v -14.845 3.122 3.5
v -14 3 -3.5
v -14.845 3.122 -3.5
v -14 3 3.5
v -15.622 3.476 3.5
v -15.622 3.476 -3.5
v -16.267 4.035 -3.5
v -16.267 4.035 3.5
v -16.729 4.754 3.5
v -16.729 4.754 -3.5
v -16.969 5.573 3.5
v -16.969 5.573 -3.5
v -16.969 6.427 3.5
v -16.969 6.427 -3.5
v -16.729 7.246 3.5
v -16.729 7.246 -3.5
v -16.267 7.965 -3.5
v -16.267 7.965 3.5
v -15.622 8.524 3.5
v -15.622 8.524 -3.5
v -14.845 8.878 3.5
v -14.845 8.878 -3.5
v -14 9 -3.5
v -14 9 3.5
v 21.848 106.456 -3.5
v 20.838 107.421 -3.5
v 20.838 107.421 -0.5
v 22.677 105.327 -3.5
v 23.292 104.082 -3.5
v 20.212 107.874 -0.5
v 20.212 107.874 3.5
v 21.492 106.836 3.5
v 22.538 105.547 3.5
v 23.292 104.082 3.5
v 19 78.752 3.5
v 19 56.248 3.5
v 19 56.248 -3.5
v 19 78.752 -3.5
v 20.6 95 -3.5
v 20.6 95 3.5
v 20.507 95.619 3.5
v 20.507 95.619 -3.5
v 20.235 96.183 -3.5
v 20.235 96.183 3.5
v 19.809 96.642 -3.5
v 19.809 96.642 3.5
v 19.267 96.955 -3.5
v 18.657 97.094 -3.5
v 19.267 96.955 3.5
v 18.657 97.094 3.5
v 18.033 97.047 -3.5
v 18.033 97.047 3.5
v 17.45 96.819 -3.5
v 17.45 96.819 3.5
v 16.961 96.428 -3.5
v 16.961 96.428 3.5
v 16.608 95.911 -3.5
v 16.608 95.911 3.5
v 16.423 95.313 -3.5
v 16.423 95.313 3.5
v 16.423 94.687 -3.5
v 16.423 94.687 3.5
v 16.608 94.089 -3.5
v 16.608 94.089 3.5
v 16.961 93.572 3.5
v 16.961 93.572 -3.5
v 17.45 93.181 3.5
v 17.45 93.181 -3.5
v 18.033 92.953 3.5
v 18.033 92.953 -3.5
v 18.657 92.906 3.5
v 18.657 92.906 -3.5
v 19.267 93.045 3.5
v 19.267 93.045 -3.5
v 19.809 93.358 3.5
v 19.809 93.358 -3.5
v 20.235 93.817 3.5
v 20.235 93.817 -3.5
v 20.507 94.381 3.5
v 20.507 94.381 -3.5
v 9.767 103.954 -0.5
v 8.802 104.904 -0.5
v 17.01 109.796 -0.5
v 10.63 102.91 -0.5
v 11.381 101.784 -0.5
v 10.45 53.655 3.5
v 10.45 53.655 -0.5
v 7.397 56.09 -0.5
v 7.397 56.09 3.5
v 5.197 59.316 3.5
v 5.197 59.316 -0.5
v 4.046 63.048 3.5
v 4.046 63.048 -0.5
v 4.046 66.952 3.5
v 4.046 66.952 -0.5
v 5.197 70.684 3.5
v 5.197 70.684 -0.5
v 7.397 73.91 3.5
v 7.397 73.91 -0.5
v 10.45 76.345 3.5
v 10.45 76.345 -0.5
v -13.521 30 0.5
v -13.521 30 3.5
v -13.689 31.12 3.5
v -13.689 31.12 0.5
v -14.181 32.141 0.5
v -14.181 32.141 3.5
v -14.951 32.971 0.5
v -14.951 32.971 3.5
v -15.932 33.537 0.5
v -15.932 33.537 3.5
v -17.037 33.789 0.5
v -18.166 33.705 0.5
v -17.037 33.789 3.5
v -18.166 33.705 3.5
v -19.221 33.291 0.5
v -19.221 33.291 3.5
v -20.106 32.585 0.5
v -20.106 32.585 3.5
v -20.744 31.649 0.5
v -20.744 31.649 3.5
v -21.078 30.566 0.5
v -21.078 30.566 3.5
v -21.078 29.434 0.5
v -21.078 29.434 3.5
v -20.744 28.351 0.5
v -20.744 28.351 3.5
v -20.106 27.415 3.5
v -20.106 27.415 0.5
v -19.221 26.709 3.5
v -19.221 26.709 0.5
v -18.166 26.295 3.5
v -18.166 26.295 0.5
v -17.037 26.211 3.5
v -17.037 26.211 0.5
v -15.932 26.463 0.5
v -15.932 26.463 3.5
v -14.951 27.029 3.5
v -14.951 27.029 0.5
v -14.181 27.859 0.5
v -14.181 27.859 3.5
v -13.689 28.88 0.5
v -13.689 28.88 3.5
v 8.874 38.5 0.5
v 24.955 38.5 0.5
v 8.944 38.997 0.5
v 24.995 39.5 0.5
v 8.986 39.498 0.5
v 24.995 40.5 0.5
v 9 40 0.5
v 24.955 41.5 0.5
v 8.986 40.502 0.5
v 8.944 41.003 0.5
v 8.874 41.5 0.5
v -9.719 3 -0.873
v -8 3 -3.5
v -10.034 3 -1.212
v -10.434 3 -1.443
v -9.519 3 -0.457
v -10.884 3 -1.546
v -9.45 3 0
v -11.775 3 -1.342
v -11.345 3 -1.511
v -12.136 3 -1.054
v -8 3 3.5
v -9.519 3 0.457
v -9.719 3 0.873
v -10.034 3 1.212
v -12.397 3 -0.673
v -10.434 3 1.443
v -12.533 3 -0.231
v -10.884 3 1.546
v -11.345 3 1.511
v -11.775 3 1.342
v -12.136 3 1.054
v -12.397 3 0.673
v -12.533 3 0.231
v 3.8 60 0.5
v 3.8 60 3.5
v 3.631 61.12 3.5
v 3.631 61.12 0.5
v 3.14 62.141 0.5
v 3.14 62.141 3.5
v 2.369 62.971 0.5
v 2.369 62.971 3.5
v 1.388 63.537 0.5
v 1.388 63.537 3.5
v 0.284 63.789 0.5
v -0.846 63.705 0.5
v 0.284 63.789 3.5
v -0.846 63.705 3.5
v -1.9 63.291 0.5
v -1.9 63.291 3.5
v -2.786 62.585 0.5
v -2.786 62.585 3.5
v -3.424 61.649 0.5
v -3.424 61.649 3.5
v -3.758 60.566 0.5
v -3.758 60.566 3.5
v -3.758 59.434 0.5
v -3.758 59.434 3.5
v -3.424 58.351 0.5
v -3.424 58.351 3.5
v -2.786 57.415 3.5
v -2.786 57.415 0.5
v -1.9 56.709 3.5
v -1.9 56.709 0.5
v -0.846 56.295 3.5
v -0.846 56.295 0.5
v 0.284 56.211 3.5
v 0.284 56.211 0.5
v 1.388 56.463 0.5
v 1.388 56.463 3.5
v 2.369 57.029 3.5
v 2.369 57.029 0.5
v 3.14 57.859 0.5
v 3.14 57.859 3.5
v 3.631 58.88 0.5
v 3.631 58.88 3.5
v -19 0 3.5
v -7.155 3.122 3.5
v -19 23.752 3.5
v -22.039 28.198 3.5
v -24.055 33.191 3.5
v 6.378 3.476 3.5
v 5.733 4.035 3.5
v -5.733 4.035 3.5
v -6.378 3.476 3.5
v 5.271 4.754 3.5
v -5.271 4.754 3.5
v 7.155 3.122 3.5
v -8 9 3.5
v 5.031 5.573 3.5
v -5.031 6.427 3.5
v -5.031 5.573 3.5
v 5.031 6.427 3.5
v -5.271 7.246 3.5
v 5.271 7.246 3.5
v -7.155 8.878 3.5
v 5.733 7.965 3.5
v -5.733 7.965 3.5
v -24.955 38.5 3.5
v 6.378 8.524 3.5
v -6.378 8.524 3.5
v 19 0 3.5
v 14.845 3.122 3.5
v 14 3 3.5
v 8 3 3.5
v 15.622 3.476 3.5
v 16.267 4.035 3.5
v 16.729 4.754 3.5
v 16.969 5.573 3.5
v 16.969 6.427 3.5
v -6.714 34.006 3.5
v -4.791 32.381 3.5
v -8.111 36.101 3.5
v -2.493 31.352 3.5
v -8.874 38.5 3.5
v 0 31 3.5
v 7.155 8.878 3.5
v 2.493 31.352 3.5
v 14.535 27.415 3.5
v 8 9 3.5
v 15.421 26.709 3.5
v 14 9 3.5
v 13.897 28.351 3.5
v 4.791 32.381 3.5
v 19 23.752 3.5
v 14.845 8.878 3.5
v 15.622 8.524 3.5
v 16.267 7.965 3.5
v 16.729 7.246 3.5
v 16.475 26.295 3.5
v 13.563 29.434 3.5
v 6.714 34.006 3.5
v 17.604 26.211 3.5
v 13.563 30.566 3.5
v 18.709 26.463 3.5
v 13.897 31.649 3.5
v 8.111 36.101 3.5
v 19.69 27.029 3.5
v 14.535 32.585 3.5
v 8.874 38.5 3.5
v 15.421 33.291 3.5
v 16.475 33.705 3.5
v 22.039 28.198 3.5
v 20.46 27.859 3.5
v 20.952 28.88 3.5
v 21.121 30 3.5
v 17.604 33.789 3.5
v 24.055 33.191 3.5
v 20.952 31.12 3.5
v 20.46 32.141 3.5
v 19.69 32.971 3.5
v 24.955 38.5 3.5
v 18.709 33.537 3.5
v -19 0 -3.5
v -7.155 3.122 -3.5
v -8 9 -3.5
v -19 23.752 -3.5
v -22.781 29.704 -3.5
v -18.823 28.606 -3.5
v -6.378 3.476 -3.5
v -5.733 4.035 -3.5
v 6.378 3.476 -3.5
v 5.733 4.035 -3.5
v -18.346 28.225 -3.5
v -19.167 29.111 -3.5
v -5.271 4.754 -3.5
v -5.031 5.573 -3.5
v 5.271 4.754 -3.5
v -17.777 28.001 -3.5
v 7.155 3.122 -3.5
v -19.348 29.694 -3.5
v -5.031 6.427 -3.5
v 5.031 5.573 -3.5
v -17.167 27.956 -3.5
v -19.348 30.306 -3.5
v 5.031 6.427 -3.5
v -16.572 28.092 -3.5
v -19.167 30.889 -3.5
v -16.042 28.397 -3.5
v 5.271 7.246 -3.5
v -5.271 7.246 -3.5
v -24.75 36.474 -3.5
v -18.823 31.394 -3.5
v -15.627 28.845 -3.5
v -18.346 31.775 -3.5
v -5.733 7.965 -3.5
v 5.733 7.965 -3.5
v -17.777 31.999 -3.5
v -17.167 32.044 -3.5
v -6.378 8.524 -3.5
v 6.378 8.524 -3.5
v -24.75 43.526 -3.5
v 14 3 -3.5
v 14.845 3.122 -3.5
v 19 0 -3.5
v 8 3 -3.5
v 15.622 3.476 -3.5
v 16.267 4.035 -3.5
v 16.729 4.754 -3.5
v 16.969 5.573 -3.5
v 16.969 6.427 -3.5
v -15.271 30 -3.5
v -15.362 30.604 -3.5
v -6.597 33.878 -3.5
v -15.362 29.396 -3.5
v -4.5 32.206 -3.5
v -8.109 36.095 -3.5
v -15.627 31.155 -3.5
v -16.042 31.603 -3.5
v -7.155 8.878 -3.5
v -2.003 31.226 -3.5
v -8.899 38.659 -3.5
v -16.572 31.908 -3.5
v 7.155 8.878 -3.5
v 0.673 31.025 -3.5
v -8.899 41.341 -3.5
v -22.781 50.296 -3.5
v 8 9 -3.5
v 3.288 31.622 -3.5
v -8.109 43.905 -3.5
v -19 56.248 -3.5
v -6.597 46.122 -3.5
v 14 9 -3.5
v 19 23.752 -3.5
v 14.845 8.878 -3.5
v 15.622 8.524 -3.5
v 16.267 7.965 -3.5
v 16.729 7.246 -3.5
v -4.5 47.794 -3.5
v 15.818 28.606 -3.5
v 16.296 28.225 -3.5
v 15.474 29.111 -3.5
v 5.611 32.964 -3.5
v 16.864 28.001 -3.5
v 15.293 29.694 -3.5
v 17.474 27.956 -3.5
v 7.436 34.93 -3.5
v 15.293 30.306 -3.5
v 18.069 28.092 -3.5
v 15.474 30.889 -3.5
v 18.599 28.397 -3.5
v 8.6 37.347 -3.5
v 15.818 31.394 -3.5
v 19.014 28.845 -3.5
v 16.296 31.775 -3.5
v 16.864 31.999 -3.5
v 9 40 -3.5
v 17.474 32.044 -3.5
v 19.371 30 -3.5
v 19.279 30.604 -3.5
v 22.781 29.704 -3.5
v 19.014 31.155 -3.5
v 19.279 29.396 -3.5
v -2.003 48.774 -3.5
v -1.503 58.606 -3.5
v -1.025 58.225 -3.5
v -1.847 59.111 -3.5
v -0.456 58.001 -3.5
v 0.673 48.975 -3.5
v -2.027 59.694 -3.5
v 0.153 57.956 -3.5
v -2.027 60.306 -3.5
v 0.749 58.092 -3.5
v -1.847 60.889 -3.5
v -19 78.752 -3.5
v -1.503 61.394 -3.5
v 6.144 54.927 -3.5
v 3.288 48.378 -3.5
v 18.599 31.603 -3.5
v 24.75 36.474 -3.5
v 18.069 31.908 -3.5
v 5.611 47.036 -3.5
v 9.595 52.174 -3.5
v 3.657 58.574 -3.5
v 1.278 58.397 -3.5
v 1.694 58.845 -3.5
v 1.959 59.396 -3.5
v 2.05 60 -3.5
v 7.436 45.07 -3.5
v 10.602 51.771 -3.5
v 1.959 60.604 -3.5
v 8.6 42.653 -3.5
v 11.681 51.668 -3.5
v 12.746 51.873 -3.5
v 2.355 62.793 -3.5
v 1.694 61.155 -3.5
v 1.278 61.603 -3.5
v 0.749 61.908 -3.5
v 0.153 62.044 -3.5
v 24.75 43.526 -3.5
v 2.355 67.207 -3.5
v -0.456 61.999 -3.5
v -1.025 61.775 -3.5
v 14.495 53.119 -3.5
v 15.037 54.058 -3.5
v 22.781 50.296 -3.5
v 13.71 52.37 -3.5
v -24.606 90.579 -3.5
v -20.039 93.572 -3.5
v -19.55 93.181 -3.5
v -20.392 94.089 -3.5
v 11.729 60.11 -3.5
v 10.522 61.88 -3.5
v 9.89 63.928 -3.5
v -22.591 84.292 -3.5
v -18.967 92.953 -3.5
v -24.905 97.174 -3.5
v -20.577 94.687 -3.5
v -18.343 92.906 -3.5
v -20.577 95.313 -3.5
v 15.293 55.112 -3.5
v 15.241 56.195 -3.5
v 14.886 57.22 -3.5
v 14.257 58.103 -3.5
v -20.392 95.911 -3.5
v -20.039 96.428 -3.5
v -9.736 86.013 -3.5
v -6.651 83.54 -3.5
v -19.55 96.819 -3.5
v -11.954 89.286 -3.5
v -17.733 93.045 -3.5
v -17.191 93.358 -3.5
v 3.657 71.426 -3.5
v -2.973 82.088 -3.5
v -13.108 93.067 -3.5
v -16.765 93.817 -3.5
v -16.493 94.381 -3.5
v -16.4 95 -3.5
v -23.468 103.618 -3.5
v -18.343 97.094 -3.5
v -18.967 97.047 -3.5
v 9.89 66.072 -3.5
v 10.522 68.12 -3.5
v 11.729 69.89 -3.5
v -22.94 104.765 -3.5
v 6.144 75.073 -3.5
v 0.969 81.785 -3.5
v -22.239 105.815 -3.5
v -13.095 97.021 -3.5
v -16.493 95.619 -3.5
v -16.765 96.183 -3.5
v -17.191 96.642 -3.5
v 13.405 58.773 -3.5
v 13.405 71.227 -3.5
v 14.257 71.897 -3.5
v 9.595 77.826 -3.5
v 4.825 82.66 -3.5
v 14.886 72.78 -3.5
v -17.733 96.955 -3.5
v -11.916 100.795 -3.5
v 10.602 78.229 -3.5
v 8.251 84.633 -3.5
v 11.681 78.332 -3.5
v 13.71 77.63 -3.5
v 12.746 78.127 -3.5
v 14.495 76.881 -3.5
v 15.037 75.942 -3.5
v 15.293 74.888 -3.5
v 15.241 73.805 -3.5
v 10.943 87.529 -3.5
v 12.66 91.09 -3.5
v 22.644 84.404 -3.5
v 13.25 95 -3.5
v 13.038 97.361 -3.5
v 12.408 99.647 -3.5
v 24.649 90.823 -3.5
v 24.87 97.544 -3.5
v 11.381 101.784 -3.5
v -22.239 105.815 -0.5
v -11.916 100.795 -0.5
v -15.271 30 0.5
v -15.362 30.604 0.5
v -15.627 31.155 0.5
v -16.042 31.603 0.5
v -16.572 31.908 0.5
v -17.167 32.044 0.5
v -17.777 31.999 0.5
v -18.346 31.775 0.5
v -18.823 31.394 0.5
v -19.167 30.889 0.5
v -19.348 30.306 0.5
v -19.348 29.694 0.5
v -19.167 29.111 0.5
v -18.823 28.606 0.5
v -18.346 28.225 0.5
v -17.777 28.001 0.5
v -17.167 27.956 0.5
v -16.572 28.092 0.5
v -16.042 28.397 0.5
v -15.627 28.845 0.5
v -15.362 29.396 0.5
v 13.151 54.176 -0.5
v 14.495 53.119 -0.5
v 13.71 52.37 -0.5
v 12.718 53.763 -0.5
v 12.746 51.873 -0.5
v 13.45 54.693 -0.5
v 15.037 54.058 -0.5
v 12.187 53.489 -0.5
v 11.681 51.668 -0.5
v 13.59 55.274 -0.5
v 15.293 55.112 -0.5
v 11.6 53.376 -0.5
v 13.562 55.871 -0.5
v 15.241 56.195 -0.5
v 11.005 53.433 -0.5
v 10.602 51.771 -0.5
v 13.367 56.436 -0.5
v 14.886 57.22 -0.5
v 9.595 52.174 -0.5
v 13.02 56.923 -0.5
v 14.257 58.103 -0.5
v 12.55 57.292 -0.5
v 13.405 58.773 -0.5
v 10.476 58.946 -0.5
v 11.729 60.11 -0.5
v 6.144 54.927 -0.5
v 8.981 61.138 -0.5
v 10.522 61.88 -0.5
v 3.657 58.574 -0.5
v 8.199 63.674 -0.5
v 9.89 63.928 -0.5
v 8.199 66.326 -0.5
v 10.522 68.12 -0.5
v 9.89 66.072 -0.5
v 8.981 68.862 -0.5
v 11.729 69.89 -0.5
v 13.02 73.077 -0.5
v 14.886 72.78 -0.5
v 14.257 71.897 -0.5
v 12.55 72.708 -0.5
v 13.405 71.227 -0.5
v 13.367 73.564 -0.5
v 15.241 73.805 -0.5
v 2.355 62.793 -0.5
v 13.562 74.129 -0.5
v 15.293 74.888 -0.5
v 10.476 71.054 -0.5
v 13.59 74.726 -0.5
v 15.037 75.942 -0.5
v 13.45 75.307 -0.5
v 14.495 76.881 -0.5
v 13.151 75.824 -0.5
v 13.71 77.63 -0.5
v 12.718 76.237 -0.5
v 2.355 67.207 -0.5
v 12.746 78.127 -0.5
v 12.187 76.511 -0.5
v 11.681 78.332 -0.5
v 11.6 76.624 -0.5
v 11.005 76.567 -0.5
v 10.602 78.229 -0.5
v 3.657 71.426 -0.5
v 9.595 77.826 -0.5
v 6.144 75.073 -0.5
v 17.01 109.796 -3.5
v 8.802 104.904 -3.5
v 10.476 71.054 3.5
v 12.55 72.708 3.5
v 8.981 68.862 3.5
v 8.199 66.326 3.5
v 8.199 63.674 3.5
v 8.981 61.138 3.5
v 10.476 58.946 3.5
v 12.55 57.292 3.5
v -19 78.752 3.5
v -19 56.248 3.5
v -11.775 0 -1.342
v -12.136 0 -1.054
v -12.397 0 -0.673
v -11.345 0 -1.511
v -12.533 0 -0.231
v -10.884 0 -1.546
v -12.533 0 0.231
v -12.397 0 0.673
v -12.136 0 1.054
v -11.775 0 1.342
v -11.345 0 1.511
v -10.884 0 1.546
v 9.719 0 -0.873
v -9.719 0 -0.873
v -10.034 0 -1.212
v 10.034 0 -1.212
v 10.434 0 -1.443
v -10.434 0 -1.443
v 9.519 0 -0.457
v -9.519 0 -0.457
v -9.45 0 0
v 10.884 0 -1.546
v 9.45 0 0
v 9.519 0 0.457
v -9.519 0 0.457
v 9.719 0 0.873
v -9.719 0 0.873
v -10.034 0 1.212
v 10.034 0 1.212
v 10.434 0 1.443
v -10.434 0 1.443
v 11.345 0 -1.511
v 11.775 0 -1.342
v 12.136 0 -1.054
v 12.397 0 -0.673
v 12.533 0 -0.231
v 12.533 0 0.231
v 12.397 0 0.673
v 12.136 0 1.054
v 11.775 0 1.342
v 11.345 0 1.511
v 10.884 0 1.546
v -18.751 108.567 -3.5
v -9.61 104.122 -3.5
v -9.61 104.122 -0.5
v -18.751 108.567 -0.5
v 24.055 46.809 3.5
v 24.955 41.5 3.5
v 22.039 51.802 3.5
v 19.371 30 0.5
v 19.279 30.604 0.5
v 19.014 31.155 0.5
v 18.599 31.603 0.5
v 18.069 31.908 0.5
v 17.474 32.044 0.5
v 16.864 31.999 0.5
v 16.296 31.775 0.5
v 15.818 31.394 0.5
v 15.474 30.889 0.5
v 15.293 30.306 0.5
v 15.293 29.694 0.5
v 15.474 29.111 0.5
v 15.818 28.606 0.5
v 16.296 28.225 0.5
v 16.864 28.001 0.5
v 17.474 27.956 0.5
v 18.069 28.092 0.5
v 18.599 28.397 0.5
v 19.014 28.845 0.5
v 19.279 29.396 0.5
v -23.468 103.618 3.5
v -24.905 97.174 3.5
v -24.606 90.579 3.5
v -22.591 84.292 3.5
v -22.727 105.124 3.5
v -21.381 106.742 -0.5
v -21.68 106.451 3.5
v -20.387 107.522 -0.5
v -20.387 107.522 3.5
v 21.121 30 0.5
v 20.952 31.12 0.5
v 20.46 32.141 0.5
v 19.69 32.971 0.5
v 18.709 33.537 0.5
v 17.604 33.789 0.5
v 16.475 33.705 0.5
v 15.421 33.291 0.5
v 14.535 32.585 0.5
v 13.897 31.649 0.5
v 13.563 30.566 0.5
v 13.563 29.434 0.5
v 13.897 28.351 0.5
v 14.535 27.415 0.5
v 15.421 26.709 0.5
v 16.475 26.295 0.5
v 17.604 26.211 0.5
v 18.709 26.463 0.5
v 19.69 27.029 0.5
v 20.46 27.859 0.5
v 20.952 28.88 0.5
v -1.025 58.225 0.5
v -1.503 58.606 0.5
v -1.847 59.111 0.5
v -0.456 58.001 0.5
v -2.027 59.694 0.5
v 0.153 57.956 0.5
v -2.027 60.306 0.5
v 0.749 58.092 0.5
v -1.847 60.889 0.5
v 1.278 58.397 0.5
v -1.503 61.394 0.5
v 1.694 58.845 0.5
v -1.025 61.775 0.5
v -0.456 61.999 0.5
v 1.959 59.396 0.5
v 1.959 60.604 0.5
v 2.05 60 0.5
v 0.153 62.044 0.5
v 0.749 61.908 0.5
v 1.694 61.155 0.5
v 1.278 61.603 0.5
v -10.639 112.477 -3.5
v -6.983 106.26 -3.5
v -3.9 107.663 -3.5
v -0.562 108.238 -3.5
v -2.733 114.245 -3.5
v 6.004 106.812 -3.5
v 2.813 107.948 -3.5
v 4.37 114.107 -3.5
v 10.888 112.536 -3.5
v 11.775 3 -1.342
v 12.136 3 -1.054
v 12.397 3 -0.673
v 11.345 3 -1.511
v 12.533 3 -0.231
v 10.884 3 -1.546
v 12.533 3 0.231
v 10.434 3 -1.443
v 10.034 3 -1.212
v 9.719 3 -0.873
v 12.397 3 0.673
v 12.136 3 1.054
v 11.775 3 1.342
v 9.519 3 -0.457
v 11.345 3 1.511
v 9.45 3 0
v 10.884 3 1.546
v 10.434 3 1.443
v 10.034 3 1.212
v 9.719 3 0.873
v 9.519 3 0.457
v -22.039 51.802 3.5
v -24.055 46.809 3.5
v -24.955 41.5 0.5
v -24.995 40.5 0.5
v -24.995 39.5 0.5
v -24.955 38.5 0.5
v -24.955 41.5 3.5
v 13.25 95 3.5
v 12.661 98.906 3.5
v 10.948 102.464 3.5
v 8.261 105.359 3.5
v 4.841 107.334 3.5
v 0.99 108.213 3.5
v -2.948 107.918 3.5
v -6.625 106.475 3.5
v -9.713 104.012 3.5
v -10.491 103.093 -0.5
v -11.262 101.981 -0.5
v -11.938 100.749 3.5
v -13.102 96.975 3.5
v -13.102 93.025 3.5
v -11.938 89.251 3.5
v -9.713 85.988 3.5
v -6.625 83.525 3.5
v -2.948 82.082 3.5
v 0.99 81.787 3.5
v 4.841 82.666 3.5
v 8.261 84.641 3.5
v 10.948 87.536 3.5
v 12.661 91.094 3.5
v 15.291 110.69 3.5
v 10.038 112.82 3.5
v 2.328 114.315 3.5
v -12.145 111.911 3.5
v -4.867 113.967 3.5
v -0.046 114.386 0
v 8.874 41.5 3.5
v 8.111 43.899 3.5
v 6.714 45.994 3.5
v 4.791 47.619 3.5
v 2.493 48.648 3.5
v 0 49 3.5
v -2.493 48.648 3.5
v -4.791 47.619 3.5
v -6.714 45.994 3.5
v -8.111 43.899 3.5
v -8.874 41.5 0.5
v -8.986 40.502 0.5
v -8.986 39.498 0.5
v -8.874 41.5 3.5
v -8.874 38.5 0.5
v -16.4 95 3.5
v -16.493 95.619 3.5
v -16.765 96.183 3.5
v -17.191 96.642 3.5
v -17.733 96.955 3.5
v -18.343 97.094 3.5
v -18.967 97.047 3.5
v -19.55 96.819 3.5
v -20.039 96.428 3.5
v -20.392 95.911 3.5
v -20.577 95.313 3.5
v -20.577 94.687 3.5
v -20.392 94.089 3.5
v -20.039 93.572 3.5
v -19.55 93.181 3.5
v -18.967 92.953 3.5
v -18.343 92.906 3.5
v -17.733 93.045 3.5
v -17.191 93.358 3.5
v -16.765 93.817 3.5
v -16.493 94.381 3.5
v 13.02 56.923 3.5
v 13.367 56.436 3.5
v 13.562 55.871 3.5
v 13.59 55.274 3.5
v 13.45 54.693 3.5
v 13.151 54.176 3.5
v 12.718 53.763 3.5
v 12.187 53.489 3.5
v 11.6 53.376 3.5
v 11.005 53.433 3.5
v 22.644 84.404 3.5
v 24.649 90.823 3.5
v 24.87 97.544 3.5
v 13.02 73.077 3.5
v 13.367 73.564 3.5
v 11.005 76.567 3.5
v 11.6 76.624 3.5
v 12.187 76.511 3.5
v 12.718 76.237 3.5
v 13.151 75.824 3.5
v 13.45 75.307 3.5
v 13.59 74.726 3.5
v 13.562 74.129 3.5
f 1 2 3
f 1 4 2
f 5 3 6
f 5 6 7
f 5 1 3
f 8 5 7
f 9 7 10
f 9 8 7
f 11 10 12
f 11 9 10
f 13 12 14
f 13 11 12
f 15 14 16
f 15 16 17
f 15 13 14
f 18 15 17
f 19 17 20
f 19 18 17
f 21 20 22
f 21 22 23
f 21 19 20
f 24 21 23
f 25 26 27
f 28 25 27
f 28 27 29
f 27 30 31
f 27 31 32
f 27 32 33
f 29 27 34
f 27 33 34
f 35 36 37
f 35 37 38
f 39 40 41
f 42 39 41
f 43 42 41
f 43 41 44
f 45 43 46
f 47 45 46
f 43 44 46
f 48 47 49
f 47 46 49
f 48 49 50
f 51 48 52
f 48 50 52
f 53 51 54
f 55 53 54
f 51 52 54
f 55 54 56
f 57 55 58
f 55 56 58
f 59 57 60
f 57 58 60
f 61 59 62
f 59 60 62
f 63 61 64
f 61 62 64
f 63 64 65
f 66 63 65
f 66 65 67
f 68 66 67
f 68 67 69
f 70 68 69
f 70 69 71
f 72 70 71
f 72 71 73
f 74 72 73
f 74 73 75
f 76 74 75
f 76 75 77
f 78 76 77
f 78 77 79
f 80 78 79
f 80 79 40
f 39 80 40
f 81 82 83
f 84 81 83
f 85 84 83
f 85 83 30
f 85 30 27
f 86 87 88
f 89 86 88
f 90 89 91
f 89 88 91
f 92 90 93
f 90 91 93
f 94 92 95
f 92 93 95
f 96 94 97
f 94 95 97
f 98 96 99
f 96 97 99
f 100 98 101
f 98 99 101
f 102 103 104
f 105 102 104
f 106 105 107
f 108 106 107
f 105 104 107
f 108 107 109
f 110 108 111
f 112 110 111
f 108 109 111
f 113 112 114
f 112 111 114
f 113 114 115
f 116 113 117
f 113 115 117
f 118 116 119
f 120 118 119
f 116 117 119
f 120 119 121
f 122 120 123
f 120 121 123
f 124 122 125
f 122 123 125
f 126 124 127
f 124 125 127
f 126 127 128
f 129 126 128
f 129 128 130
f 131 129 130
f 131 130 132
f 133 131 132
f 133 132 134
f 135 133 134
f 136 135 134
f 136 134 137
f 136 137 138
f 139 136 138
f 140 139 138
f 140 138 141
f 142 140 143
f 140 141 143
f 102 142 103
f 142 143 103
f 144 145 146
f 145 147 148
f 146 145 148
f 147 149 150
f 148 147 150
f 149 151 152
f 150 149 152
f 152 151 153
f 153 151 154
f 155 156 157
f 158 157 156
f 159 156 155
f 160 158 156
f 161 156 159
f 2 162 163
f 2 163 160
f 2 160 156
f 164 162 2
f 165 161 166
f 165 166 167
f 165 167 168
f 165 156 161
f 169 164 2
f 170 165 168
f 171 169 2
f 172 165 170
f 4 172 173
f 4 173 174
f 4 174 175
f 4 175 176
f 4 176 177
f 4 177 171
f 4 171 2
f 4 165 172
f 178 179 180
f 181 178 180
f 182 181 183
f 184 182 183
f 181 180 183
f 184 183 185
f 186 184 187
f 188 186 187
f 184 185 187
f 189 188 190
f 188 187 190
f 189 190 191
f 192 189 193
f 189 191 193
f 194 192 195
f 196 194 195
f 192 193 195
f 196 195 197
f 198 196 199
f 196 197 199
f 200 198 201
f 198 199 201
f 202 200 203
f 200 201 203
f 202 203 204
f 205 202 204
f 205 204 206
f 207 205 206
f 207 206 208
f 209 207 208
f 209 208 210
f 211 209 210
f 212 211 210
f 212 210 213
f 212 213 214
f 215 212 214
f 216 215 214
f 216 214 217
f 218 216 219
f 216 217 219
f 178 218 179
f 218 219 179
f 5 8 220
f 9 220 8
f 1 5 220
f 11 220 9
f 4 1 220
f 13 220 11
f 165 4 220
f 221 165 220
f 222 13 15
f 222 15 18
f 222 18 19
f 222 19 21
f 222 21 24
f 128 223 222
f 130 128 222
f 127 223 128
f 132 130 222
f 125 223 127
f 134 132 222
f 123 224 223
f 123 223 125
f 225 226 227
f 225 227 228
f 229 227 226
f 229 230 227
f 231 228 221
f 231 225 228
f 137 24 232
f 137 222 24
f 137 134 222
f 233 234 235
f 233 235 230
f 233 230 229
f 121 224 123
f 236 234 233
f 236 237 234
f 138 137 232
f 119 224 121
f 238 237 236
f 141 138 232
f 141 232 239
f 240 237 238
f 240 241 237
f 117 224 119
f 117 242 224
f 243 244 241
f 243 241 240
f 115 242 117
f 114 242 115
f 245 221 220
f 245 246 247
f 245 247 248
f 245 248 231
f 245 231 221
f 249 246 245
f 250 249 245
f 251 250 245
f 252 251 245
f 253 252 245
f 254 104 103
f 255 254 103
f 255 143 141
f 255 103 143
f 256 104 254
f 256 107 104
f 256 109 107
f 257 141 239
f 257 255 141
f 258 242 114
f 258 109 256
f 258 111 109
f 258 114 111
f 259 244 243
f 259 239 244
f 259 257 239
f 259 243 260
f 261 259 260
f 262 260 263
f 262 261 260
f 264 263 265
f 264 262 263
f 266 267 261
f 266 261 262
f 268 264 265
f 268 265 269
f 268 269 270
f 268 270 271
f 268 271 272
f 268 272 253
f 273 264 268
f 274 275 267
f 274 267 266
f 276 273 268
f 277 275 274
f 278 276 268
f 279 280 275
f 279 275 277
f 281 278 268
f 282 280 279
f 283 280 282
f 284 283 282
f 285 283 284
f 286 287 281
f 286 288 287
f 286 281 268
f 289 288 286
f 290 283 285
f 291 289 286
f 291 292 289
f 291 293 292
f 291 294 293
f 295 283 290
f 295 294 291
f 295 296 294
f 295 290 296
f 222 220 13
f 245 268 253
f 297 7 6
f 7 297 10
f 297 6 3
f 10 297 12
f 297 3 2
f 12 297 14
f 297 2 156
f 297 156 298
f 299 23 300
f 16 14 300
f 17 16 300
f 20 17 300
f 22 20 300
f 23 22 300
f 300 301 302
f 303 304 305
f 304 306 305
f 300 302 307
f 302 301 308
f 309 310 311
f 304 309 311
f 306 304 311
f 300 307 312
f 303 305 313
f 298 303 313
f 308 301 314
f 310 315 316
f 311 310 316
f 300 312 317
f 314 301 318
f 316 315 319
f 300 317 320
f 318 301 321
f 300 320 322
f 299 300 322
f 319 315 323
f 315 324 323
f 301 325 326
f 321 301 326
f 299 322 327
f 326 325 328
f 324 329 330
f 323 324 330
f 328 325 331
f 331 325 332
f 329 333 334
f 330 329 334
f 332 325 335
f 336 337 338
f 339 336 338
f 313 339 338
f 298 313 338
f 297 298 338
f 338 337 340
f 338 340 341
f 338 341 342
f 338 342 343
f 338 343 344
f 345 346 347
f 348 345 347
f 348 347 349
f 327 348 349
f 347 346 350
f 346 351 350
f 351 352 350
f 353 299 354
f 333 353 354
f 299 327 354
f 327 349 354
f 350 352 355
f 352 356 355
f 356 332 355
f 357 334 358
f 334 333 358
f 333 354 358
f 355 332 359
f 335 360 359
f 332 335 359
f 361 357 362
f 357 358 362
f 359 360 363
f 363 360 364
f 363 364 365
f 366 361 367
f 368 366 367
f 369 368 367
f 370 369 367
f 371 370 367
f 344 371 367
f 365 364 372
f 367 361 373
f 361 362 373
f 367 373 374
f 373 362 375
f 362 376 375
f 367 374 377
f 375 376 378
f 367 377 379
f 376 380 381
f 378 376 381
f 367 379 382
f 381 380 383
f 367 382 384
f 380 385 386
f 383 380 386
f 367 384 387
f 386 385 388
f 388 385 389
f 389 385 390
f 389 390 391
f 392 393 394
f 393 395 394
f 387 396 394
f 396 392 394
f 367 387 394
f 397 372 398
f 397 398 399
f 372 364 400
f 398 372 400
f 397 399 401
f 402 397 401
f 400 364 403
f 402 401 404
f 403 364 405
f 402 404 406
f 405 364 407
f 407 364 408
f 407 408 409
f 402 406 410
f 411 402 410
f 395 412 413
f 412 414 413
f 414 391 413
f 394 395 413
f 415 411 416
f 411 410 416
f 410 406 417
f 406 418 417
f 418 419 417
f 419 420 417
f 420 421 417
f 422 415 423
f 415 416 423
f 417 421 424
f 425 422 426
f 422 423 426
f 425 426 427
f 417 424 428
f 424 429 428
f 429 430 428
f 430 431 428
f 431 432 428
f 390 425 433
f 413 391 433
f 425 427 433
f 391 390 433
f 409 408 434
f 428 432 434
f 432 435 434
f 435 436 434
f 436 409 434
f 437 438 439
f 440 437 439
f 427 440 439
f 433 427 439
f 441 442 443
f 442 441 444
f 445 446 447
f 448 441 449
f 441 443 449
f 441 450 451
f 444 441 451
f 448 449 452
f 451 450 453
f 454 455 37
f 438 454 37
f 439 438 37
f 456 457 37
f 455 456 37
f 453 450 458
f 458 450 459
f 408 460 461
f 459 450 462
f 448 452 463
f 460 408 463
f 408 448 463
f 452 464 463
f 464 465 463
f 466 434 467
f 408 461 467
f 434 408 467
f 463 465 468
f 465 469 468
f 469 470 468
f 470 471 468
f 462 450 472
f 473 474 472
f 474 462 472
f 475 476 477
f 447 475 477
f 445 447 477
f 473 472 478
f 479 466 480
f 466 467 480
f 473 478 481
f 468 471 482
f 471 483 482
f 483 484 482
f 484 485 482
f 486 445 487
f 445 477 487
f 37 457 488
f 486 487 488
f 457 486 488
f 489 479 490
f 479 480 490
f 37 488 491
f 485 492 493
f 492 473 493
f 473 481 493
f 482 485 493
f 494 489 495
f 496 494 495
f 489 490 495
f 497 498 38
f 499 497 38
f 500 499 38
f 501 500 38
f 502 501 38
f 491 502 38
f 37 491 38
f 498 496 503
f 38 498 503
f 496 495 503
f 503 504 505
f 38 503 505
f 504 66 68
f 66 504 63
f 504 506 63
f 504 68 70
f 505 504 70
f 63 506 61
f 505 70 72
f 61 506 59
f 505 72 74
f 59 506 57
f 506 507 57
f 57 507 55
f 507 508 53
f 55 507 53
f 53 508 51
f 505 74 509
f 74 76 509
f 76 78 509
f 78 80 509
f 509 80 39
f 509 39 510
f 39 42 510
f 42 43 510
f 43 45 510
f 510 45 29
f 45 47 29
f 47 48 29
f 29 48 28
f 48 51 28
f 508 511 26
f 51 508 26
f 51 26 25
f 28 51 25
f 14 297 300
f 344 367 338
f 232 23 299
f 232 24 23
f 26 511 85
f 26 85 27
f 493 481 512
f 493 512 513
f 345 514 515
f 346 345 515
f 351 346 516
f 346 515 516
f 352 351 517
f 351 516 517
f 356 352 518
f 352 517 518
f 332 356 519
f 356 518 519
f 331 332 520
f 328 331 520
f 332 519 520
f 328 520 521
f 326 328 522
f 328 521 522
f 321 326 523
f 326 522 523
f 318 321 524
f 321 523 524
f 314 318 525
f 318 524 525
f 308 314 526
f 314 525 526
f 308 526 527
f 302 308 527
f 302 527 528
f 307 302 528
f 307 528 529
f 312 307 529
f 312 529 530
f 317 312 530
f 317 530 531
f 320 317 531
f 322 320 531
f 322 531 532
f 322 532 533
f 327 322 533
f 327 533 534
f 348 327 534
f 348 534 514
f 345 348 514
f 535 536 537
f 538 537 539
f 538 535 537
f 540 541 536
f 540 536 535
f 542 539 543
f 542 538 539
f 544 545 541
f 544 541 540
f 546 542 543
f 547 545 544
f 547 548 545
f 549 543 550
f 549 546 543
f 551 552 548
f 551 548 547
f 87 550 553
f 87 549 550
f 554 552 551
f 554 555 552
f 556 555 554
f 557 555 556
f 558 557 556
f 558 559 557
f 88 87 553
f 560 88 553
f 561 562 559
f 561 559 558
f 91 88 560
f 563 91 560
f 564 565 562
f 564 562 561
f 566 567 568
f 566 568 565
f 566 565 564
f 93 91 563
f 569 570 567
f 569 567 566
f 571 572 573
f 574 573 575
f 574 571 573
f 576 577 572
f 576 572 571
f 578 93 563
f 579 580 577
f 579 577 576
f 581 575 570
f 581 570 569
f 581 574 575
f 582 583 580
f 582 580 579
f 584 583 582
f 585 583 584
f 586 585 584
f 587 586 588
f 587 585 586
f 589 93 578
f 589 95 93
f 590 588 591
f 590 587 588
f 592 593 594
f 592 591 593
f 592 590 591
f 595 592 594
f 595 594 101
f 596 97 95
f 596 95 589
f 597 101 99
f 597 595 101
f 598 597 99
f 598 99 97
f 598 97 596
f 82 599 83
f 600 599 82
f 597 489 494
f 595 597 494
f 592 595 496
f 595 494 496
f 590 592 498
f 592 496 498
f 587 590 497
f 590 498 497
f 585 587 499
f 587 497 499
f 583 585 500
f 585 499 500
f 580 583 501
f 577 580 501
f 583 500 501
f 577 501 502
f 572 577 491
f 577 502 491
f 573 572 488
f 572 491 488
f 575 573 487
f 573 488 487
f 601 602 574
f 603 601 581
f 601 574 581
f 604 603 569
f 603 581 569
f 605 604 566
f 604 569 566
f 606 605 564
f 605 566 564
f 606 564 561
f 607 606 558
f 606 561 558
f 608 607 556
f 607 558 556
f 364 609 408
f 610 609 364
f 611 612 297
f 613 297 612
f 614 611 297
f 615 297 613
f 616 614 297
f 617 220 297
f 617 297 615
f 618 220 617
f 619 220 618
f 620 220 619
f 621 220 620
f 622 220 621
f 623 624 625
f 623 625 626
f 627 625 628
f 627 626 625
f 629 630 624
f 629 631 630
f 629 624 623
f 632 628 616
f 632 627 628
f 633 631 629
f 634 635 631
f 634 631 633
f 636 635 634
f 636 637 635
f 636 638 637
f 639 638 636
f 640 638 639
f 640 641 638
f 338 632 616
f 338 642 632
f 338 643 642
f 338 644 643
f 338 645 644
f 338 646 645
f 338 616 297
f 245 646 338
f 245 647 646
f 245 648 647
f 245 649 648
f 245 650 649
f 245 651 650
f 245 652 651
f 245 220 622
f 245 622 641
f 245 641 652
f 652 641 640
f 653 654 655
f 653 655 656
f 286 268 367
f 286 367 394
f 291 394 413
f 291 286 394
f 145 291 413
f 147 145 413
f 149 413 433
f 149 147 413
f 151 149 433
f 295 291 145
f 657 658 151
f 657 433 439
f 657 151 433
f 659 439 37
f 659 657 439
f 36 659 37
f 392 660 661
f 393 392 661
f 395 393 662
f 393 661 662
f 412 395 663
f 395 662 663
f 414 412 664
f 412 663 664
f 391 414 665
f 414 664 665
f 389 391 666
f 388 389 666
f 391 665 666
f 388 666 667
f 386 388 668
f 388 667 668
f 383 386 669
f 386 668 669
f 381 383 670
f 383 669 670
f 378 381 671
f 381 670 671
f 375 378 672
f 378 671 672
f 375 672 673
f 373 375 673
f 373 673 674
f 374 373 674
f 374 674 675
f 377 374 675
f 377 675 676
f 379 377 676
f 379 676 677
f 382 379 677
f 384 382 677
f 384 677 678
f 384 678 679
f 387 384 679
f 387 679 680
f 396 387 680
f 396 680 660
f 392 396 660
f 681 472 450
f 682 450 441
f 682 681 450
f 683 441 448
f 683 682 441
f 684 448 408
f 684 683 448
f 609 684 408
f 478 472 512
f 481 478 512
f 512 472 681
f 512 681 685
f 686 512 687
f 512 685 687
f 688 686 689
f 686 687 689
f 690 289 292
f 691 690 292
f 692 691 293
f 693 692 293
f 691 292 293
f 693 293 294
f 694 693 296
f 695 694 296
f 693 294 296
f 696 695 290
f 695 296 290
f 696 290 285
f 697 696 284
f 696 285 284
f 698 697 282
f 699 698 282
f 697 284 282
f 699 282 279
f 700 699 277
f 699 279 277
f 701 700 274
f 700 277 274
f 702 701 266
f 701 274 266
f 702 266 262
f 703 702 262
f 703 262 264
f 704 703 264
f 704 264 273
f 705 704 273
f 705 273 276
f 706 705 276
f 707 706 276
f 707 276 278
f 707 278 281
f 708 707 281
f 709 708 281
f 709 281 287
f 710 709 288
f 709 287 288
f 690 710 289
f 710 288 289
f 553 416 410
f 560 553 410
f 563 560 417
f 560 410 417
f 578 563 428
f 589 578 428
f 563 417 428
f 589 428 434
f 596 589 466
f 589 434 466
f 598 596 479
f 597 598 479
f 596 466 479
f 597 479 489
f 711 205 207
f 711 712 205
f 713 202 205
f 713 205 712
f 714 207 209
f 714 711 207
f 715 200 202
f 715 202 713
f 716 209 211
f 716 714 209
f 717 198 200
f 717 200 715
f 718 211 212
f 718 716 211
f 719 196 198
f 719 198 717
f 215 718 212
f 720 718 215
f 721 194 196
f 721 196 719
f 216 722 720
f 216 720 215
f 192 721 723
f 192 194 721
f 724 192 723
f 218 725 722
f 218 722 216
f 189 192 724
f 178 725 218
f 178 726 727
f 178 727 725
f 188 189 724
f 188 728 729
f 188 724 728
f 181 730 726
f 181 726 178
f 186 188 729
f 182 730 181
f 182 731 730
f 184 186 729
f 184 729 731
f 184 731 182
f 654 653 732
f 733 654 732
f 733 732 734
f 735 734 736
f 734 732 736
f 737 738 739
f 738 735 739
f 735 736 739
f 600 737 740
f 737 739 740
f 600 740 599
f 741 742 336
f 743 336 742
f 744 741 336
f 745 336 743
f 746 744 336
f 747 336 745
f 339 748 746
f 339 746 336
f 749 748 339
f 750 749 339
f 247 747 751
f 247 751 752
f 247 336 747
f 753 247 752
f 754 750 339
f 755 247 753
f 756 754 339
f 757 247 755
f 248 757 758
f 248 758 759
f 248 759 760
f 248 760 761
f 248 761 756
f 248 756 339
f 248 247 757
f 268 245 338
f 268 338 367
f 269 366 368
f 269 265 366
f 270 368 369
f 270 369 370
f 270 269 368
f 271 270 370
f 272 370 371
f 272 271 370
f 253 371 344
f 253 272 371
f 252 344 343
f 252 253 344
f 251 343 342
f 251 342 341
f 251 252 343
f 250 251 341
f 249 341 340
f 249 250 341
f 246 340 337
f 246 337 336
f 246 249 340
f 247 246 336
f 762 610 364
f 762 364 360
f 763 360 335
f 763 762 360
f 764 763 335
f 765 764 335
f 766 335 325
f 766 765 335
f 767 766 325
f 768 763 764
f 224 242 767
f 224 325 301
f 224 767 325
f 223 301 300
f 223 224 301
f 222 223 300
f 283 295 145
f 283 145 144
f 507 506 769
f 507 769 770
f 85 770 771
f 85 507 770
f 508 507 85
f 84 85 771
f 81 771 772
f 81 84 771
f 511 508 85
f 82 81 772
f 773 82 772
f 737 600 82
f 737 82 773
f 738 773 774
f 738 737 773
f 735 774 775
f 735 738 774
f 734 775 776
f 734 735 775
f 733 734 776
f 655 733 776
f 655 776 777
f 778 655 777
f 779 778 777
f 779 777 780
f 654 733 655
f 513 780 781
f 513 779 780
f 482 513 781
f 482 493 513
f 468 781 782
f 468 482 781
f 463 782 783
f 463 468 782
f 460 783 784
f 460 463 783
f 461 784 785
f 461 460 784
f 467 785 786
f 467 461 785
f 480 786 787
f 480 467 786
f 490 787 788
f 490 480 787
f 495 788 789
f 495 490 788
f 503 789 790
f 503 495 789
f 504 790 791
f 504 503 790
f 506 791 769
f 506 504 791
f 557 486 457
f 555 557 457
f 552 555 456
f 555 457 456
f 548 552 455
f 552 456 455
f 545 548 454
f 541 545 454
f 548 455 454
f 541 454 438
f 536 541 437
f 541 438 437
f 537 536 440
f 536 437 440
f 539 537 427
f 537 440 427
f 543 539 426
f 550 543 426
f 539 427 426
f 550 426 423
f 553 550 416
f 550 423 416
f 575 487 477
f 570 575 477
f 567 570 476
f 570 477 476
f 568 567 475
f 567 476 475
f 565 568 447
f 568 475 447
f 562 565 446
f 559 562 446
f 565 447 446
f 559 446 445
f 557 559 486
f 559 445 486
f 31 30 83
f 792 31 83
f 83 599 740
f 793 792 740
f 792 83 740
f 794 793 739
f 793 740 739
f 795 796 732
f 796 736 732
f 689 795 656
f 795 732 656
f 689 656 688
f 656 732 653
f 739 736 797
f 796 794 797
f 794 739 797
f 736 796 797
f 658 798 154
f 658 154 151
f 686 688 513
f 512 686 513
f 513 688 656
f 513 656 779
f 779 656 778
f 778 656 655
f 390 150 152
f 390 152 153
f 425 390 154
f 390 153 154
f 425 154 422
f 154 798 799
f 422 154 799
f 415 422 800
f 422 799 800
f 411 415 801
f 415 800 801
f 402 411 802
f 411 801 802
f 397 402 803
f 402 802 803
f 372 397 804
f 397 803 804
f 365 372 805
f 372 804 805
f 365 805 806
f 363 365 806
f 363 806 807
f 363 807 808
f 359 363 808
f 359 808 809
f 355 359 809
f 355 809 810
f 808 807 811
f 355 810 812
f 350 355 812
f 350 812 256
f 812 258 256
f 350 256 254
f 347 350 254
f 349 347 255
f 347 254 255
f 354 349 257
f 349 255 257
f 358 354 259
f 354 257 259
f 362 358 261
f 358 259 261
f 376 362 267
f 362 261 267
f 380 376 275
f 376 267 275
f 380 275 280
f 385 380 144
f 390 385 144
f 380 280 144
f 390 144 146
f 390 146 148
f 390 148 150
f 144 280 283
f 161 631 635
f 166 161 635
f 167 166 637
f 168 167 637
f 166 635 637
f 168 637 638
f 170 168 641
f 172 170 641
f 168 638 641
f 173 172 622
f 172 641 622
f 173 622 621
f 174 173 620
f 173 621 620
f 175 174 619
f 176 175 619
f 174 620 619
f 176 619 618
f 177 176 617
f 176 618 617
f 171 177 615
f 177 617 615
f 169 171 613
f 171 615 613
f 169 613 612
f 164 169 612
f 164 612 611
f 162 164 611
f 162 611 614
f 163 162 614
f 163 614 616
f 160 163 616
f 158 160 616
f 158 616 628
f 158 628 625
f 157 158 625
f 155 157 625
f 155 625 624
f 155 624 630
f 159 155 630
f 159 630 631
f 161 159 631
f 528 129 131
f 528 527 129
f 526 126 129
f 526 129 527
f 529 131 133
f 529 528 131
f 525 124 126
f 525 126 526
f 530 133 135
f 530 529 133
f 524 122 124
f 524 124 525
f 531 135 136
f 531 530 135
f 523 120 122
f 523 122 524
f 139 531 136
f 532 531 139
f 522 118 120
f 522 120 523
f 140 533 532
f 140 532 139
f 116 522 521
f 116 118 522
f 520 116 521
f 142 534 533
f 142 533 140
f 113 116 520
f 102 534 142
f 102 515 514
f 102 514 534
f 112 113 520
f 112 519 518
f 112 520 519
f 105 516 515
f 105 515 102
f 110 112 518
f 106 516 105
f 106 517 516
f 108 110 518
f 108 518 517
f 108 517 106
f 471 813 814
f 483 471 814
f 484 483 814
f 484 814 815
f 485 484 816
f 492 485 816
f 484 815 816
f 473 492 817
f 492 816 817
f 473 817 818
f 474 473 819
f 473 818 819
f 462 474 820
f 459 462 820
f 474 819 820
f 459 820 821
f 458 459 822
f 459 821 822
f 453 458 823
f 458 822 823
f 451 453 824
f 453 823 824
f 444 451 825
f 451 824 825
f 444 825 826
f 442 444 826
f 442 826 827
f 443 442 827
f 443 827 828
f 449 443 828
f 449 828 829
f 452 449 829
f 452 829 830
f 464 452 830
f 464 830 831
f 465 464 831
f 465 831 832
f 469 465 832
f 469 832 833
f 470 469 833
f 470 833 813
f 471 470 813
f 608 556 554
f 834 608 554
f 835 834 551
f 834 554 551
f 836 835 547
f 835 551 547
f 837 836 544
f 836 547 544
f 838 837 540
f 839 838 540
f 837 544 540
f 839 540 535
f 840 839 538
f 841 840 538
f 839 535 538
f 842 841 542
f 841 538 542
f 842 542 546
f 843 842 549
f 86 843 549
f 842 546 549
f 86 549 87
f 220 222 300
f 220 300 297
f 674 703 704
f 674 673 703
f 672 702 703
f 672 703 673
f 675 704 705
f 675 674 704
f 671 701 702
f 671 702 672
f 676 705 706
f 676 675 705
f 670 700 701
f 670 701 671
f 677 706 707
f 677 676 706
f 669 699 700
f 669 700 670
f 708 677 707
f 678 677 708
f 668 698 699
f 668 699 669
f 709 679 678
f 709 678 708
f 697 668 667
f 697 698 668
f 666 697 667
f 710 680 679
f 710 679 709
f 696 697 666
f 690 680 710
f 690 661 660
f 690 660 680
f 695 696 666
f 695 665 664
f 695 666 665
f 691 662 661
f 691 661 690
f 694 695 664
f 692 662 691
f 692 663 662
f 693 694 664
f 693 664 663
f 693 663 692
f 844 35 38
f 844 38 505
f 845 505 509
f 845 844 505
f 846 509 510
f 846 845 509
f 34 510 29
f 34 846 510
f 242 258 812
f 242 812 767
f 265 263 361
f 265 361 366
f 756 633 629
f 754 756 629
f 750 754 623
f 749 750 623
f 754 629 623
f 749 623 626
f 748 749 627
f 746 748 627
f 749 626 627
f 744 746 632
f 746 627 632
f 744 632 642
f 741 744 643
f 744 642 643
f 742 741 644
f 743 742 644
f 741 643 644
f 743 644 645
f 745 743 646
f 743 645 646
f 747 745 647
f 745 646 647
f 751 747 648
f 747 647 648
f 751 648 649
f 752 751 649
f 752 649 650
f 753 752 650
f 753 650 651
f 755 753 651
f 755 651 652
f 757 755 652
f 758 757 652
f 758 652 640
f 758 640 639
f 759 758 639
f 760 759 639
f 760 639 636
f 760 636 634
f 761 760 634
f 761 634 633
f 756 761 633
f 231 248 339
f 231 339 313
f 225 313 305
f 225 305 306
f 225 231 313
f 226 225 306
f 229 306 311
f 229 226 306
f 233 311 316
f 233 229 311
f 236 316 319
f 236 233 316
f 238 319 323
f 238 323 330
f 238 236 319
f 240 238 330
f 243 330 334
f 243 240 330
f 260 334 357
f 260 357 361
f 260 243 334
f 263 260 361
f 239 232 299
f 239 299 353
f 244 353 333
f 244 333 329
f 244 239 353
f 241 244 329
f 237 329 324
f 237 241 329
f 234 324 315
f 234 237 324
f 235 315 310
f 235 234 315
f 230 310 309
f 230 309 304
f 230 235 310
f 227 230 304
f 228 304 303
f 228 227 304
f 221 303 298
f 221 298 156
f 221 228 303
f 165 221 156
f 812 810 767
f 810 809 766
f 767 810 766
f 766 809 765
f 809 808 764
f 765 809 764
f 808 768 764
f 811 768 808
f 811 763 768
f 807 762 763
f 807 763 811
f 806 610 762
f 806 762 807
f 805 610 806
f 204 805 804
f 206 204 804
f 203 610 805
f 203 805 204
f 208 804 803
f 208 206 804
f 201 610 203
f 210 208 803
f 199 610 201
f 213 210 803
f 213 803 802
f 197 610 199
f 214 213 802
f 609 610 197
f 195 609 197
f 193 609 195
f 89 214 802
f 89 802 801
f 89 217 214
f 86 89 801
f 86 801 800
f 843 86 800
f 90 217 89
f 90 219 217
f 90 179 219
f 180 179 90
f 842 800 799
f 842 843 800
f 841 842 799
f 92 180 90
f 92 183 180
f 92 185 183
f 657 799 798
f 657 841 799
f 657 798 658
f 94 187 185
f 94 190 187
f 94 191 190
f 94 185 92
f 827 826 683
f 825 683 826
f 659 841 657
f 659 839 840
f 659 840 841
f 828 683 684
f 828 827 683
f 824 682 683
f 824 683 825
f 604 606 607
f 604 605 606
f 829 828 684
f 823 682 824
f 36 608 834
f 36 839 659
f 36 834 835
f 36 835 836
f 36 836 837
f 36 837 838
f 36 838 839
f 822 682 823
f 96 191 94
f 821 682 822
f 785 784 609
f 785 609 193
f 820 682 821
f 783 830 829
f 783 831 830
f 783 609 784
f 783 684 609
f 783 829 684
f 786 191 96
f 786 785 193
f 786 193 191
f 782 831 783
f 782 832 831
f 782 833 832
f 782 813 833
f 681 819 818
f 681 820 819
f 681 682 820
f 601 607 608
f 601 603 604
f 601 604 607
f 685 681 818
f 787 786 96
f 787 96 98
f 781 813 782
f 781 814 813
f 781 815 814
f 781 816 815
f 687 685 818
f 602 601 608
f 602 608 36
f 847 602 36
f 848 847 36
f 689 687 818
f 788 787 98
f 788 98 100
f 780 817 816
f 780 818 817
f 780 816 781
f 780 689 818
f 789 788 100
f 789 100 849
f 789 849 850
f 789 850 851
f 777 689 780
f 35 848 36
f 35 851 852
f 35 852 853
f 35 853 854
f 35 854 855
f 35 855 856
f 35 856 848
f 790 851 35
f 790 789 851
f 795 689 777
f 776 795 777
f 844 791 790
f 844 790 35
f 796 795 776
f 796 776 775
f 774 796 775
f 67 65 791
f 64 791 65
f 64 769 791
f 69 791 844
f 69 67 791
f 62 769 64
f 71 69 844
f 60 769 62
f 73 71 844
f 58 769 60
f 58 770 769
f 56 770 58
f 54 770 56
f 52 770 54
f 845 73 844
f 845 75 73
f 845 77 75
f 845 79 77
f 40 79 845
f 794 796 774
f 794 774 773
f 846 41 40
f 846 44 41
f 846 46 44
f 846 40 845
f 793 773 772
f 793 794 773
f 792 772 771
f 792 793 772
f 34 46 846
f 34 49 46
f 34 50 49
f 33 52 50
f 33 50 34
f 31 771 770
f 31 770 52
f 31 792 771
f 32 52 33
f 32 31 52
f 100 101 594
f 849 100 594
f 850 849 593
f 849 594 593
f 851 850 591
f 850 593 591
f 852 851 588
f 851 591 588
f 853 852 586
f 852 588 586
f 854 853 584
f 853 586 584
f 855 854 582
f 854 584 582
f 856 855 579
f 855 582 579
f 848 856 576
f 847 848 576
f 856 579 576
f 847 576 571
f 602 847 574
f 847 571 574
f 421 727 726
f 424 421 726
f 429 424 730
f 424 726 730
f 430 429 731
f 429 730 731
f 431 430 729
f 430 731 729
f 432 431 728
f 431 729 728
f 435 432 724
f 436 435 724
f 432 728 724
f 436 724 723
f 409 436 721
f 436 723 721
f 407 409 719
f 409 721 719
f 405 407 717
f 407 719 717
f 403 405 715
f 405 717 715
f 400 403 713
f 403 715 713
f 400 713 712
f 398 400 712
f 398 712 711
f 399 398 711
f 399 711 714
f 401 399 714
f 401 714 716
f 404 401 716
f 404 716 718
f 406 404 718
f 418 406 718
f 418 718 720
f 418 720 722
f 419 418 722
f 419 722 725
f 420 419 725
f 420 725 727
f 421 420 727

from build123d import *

# Parameters (mm, degrees)
SKETCH_1_R          = 13.25
EXTRUDE_1_DEPTH     = 3.5
SKETCH4_R           = 1.55
CUT_EXTRUDE5_DEPTH  = 5
SKETCH_2_R          = 2.1
CUT_EXTRUDE_1_DEPTH = 10
CUT_EXTRUDE_2_DEPTH = 171.144056611
FILLET_1_R          = 8
CUT_EXTRUDE_3_DEPTH = 3
SKETCH_6_R          = 25
EXTRUDE_2_DEPTH     = 7
SKETCH_7_R          = 9
SKETCH_7_R_2        = 2.05
CUT_EXTRUDE_4_DEPTH = 30
CUT_EXTRUDE_5_DEPTH = 3
SKETCH_11_R         = 3.8
SKETCH_11_R_2       = 2.05
CUT_EXTRUDE_8_DEPTH = 3
CUT_EXTRUDE_6_DEPTH = 10
CUT_EXTRUDE_7_DEPTH = 3


with BuildPart() as part:
    # 草图1 → 凸台-拉伸1 (new, symmetric)
    with BuildSketch(Plane.XY):
        with BuildLine():
            Line((-19, 0), (19, 0))
            Line((19, 0), (19, 78.751923191))
            ThreePointArc((19, 78.751923191), (0, 120), (-19, 78.751923191))
            Line((-19, 78.751923191), (-19, 0))
        make_face()
        with BuildLine():
            ThreePointArc((-8, 9), (-5, 6), (-8, 3))
            Line((-8, 3), (-14, 3))
            ThreePointArc((-14, 3), (-17, 6), (-14, 9))
            Line((-14, 9), (-8, 9))
        make_face(mode=Mode.SUBTRACT)
        with BuildLine():
            ThreePointArc((8, 3), (5, 6), (8, 9))
            Line((8, 9), (14, 9))
            ThreePointArc((14, 9), (17, 6), (14, 3))
            Line((14, 3), (8, 3))
        make_face(mode=Mode.SUBTRACT)
        with Locations((0, 95)):
            Circle(SKETCH_1_R, mode=Mode.SUBTRACT)
    extrude(amount=EXTRUDE_1_DEPTH, both=True)

    # Sketch4 → Cut-Extrude5 (cut)
    with BuildSketch(Plane(origin=(0, 0, 0), x_dir=(-1, 0, 0), z_dir=(0, -1, 0))):
        with Locations(Location((11, 0, 0), (0, 0, 180))):
            Circle(SKETCH4_R)
        with Locations((-11, 0)):
            Circle(SKETCH4_R)
    extrude(amount=-CUT_EXTRUDE5_DEPTH, mode=Mode.SUBTRACT)

    # 草图2 → 切除-拉伸1 (cut)
    with BuildSketch(Plane.XY.offset(3.5)):
        with Locations((-18.5, 95)):
            Circle(SKETCH_2_R)
        with Locations((18.5, 95)):
            Circle(SKETCH_2_R)
    extrude(amount=-CUT_EXTRUDE_1_DEPTH, mode=Mode.SUBTRACT)

    # 草图4 → 切除-拉伸2 (cut, through all)
    with BuildSketch(Plane(origin=(0, 0, -114.5), x_dir=(-1, 0, 0), z_dir=(0, 0, -1))):
        with BuildLine():
            ThreePointArc((22.386292421, 106.128967232), (0.219572962, 119.999035736), (-22.187356595, 106.520469059))
            add(Edge.make_bspline(
                [(-22.187356595, 106.520469059), (0, 122.446847778), (22.386292421, 106.128967232)],
                knots=[0, 0, 0, 1, 1, 1], degree=2))
        make_face()
    extrude(amount=-CUT_EXTRUDE_2_DEPTH, mode=Mode.SUBTRACT)

    # 圆角1
    fillet_1_edges = [part.edges().sort_by_distance(p)[0] for p in [
        (-22.386292421, 106.128967232, 0),
        (22.187356595, 106.520469059, 0),
    ]]
    fillet(fillet_1_edges, radius=FILLET_1_R)

    # 草图5 → 切除-拉伸3 (cut)
    with BuildSketch(Plane.XY.offset(-3.5)):
        Polygon((-22.238605802, 105.815360884), (0, 95), (-0.192853393, 99.54174681), (-22.228779927, 110.258538141), align=None)
        Polygon((-0.192853393, 99.54174681), (0, 95), (21.241716437, 107.661638988), (20.855269273, 112.087989547), align=None)
    extrude(amount=CUT_EXTRUDE_3_DEPTH, mode=Mode.SUBTRACT)

    # 草图6 → 凸台-拉伸2 (add)
    with BuildSketch(Plane.XY.offset(3.5)):
        with Locations((0, 40)):
            Circle(SKETCH_6_R)
    extrude(amount=-EXTRUDE_2_DEPTH)

    # 草图7 → 切除-拉伸4 (cut)
    with BuildSketch(Plane.XY.offset(3.5)):
        with Locations((0, 40)):
            Circle(SKETCH_7_R)
        with Locations((0, 60)):
            Circle(SKETCH_7_R_2)
        with Locations((17.320508076, 30)):
            Circle(SKETCH_7_R_2)
        with Locations((-17.320508076, 30)):
            Circle(SKETCH_7_R_2)
    extrude(amount=-CUT_EXTRUDE_4_DEPTH, mode=Mode.SUBTRACT)

    # 草图8 → 切除-拉伸5 (cut)
    with BuildSketch(Plane(origin=(0, 0, 3.5), x_dir=(-1, 0, 0), z_dir=(0, 0, -1))):
        Polygon((-25, 41.5), (-25, 38.5), (24.954959427, 38.5), (25.455331414, 41.5), align=None)
    extrude(amount=CUT_EXTRUDE_5_DEPTH, mode=Mode.SUBTRACT)

    # 草图11 → 切除-拉伸8 (cut)
    # profile 1 of 3: a face of its own
    with BuildSketch(Plane.XY.offset(3.5)):
        with Locations((0, 60)):
            Circle(SKETCH_11_R)
        with Locations((0, 60)):
            Circle(SKETCH_11_R_2, mode=Mode.SUBTRACT)
    # profile 2 of 3: a face of its own
    with BuildSketch(Plane.XY.offset(3.5)):
        with Locations((-17.320508076, 30)):
            Circle(SKETCH_11_R)
        with Locations((-17.320508076, 30)):
            Circle(SKETCH_11_R_2, mode=Mode.SUBTRACT)
    # profile 3 of 3: a face of its own
    with BuildSketch(Plane.XY.offset(3.5)):
        with Locations((17.320508076, 30)):
            Circle(SKETCH_11_R)
        with Locations((17.320508076, 30)):
            Circle(SKETCH_11_R_2, mode=Mode.SUBTRACT)
    extrude(amount=-CUT_EXTRUDE_8_DEPTH, mode=Mode.SUBTRACT)

    # 草图9 → 切除-拉伸6 (cut)
    with BuildSketch(Plane(origin=(0, 0, -3.5), x_dir=(-1, 0, 0), z_dir=(0, 0, -1))):
        with BuildLine():
            ThreePointArc((-10.45, 53.65506721), (-3.9, 65), (-10.45, 76.34493279))
            ThreePointArc((-10.45, 76.34493279), (-13.318653348, 75.576279442), (-12.55, 72.707626094))
            ThreePointArc((-12.55, 72.707626094), (-8.1, 65), (-12.55, 57.292373906))
            ThreePointArc((-12.55, 57.292373906), (-13.318653348, 54.423720558), (-10.45, 53.65506721))
        make_face()
    extrude(amount=-CUT_EXTRUDE_6_DEPTH, mode=Mode.SUBTRACT)

    # 草图10 → 切除-拉伸7 (cut)
    with BuildSketch(Plane(origin=(0, 0, -3.5), x_dir=(-1, 0, 0), z_dir=(0, 0, -1))):
        with BuildLine():
            ThreePointArc((-9.595, 52.17416377), (-2.19, 65), (-9.595, 77.82583623))
            ThreePointArc((-9.595, 77.82583623), (-14.799556788, 76.431279442), (-13.405, 71.226722653))
            ThreePointArc((-13.405, 71.226722653), (-9.81, 65), (-13.405, 58.773277347))
            ThreePointArc((-13.405, 58.773277347), (-14.799556788, 53.568720558), (-9.595, 52.17416377))
        make_face()
        with BuildLine():
            ThreePointArc((-12.55, 57.292373906), (-13.318653348, 54.423720558), (-10.45, 53.65506721))
            ThreePointArc((-10.45, 53.65506721), (-3.9, 65), (-10.45, 76.34493279))
            ThreePointArc((-10.45, 76.34493279), (-13.318653348, 75.576279442), (-12.55, 72.707626094))
            ThreePointArc((-12.55, 72.707626094), (-8.1, 65), (-12.55, 57.292373906))
        make_face(mode=Mode.SUBTRACT)
    extrude(amount=-CUT_EXTRUDE_7_DEPTH, mode=Mode.SUBTRACT)


solid = part.part
